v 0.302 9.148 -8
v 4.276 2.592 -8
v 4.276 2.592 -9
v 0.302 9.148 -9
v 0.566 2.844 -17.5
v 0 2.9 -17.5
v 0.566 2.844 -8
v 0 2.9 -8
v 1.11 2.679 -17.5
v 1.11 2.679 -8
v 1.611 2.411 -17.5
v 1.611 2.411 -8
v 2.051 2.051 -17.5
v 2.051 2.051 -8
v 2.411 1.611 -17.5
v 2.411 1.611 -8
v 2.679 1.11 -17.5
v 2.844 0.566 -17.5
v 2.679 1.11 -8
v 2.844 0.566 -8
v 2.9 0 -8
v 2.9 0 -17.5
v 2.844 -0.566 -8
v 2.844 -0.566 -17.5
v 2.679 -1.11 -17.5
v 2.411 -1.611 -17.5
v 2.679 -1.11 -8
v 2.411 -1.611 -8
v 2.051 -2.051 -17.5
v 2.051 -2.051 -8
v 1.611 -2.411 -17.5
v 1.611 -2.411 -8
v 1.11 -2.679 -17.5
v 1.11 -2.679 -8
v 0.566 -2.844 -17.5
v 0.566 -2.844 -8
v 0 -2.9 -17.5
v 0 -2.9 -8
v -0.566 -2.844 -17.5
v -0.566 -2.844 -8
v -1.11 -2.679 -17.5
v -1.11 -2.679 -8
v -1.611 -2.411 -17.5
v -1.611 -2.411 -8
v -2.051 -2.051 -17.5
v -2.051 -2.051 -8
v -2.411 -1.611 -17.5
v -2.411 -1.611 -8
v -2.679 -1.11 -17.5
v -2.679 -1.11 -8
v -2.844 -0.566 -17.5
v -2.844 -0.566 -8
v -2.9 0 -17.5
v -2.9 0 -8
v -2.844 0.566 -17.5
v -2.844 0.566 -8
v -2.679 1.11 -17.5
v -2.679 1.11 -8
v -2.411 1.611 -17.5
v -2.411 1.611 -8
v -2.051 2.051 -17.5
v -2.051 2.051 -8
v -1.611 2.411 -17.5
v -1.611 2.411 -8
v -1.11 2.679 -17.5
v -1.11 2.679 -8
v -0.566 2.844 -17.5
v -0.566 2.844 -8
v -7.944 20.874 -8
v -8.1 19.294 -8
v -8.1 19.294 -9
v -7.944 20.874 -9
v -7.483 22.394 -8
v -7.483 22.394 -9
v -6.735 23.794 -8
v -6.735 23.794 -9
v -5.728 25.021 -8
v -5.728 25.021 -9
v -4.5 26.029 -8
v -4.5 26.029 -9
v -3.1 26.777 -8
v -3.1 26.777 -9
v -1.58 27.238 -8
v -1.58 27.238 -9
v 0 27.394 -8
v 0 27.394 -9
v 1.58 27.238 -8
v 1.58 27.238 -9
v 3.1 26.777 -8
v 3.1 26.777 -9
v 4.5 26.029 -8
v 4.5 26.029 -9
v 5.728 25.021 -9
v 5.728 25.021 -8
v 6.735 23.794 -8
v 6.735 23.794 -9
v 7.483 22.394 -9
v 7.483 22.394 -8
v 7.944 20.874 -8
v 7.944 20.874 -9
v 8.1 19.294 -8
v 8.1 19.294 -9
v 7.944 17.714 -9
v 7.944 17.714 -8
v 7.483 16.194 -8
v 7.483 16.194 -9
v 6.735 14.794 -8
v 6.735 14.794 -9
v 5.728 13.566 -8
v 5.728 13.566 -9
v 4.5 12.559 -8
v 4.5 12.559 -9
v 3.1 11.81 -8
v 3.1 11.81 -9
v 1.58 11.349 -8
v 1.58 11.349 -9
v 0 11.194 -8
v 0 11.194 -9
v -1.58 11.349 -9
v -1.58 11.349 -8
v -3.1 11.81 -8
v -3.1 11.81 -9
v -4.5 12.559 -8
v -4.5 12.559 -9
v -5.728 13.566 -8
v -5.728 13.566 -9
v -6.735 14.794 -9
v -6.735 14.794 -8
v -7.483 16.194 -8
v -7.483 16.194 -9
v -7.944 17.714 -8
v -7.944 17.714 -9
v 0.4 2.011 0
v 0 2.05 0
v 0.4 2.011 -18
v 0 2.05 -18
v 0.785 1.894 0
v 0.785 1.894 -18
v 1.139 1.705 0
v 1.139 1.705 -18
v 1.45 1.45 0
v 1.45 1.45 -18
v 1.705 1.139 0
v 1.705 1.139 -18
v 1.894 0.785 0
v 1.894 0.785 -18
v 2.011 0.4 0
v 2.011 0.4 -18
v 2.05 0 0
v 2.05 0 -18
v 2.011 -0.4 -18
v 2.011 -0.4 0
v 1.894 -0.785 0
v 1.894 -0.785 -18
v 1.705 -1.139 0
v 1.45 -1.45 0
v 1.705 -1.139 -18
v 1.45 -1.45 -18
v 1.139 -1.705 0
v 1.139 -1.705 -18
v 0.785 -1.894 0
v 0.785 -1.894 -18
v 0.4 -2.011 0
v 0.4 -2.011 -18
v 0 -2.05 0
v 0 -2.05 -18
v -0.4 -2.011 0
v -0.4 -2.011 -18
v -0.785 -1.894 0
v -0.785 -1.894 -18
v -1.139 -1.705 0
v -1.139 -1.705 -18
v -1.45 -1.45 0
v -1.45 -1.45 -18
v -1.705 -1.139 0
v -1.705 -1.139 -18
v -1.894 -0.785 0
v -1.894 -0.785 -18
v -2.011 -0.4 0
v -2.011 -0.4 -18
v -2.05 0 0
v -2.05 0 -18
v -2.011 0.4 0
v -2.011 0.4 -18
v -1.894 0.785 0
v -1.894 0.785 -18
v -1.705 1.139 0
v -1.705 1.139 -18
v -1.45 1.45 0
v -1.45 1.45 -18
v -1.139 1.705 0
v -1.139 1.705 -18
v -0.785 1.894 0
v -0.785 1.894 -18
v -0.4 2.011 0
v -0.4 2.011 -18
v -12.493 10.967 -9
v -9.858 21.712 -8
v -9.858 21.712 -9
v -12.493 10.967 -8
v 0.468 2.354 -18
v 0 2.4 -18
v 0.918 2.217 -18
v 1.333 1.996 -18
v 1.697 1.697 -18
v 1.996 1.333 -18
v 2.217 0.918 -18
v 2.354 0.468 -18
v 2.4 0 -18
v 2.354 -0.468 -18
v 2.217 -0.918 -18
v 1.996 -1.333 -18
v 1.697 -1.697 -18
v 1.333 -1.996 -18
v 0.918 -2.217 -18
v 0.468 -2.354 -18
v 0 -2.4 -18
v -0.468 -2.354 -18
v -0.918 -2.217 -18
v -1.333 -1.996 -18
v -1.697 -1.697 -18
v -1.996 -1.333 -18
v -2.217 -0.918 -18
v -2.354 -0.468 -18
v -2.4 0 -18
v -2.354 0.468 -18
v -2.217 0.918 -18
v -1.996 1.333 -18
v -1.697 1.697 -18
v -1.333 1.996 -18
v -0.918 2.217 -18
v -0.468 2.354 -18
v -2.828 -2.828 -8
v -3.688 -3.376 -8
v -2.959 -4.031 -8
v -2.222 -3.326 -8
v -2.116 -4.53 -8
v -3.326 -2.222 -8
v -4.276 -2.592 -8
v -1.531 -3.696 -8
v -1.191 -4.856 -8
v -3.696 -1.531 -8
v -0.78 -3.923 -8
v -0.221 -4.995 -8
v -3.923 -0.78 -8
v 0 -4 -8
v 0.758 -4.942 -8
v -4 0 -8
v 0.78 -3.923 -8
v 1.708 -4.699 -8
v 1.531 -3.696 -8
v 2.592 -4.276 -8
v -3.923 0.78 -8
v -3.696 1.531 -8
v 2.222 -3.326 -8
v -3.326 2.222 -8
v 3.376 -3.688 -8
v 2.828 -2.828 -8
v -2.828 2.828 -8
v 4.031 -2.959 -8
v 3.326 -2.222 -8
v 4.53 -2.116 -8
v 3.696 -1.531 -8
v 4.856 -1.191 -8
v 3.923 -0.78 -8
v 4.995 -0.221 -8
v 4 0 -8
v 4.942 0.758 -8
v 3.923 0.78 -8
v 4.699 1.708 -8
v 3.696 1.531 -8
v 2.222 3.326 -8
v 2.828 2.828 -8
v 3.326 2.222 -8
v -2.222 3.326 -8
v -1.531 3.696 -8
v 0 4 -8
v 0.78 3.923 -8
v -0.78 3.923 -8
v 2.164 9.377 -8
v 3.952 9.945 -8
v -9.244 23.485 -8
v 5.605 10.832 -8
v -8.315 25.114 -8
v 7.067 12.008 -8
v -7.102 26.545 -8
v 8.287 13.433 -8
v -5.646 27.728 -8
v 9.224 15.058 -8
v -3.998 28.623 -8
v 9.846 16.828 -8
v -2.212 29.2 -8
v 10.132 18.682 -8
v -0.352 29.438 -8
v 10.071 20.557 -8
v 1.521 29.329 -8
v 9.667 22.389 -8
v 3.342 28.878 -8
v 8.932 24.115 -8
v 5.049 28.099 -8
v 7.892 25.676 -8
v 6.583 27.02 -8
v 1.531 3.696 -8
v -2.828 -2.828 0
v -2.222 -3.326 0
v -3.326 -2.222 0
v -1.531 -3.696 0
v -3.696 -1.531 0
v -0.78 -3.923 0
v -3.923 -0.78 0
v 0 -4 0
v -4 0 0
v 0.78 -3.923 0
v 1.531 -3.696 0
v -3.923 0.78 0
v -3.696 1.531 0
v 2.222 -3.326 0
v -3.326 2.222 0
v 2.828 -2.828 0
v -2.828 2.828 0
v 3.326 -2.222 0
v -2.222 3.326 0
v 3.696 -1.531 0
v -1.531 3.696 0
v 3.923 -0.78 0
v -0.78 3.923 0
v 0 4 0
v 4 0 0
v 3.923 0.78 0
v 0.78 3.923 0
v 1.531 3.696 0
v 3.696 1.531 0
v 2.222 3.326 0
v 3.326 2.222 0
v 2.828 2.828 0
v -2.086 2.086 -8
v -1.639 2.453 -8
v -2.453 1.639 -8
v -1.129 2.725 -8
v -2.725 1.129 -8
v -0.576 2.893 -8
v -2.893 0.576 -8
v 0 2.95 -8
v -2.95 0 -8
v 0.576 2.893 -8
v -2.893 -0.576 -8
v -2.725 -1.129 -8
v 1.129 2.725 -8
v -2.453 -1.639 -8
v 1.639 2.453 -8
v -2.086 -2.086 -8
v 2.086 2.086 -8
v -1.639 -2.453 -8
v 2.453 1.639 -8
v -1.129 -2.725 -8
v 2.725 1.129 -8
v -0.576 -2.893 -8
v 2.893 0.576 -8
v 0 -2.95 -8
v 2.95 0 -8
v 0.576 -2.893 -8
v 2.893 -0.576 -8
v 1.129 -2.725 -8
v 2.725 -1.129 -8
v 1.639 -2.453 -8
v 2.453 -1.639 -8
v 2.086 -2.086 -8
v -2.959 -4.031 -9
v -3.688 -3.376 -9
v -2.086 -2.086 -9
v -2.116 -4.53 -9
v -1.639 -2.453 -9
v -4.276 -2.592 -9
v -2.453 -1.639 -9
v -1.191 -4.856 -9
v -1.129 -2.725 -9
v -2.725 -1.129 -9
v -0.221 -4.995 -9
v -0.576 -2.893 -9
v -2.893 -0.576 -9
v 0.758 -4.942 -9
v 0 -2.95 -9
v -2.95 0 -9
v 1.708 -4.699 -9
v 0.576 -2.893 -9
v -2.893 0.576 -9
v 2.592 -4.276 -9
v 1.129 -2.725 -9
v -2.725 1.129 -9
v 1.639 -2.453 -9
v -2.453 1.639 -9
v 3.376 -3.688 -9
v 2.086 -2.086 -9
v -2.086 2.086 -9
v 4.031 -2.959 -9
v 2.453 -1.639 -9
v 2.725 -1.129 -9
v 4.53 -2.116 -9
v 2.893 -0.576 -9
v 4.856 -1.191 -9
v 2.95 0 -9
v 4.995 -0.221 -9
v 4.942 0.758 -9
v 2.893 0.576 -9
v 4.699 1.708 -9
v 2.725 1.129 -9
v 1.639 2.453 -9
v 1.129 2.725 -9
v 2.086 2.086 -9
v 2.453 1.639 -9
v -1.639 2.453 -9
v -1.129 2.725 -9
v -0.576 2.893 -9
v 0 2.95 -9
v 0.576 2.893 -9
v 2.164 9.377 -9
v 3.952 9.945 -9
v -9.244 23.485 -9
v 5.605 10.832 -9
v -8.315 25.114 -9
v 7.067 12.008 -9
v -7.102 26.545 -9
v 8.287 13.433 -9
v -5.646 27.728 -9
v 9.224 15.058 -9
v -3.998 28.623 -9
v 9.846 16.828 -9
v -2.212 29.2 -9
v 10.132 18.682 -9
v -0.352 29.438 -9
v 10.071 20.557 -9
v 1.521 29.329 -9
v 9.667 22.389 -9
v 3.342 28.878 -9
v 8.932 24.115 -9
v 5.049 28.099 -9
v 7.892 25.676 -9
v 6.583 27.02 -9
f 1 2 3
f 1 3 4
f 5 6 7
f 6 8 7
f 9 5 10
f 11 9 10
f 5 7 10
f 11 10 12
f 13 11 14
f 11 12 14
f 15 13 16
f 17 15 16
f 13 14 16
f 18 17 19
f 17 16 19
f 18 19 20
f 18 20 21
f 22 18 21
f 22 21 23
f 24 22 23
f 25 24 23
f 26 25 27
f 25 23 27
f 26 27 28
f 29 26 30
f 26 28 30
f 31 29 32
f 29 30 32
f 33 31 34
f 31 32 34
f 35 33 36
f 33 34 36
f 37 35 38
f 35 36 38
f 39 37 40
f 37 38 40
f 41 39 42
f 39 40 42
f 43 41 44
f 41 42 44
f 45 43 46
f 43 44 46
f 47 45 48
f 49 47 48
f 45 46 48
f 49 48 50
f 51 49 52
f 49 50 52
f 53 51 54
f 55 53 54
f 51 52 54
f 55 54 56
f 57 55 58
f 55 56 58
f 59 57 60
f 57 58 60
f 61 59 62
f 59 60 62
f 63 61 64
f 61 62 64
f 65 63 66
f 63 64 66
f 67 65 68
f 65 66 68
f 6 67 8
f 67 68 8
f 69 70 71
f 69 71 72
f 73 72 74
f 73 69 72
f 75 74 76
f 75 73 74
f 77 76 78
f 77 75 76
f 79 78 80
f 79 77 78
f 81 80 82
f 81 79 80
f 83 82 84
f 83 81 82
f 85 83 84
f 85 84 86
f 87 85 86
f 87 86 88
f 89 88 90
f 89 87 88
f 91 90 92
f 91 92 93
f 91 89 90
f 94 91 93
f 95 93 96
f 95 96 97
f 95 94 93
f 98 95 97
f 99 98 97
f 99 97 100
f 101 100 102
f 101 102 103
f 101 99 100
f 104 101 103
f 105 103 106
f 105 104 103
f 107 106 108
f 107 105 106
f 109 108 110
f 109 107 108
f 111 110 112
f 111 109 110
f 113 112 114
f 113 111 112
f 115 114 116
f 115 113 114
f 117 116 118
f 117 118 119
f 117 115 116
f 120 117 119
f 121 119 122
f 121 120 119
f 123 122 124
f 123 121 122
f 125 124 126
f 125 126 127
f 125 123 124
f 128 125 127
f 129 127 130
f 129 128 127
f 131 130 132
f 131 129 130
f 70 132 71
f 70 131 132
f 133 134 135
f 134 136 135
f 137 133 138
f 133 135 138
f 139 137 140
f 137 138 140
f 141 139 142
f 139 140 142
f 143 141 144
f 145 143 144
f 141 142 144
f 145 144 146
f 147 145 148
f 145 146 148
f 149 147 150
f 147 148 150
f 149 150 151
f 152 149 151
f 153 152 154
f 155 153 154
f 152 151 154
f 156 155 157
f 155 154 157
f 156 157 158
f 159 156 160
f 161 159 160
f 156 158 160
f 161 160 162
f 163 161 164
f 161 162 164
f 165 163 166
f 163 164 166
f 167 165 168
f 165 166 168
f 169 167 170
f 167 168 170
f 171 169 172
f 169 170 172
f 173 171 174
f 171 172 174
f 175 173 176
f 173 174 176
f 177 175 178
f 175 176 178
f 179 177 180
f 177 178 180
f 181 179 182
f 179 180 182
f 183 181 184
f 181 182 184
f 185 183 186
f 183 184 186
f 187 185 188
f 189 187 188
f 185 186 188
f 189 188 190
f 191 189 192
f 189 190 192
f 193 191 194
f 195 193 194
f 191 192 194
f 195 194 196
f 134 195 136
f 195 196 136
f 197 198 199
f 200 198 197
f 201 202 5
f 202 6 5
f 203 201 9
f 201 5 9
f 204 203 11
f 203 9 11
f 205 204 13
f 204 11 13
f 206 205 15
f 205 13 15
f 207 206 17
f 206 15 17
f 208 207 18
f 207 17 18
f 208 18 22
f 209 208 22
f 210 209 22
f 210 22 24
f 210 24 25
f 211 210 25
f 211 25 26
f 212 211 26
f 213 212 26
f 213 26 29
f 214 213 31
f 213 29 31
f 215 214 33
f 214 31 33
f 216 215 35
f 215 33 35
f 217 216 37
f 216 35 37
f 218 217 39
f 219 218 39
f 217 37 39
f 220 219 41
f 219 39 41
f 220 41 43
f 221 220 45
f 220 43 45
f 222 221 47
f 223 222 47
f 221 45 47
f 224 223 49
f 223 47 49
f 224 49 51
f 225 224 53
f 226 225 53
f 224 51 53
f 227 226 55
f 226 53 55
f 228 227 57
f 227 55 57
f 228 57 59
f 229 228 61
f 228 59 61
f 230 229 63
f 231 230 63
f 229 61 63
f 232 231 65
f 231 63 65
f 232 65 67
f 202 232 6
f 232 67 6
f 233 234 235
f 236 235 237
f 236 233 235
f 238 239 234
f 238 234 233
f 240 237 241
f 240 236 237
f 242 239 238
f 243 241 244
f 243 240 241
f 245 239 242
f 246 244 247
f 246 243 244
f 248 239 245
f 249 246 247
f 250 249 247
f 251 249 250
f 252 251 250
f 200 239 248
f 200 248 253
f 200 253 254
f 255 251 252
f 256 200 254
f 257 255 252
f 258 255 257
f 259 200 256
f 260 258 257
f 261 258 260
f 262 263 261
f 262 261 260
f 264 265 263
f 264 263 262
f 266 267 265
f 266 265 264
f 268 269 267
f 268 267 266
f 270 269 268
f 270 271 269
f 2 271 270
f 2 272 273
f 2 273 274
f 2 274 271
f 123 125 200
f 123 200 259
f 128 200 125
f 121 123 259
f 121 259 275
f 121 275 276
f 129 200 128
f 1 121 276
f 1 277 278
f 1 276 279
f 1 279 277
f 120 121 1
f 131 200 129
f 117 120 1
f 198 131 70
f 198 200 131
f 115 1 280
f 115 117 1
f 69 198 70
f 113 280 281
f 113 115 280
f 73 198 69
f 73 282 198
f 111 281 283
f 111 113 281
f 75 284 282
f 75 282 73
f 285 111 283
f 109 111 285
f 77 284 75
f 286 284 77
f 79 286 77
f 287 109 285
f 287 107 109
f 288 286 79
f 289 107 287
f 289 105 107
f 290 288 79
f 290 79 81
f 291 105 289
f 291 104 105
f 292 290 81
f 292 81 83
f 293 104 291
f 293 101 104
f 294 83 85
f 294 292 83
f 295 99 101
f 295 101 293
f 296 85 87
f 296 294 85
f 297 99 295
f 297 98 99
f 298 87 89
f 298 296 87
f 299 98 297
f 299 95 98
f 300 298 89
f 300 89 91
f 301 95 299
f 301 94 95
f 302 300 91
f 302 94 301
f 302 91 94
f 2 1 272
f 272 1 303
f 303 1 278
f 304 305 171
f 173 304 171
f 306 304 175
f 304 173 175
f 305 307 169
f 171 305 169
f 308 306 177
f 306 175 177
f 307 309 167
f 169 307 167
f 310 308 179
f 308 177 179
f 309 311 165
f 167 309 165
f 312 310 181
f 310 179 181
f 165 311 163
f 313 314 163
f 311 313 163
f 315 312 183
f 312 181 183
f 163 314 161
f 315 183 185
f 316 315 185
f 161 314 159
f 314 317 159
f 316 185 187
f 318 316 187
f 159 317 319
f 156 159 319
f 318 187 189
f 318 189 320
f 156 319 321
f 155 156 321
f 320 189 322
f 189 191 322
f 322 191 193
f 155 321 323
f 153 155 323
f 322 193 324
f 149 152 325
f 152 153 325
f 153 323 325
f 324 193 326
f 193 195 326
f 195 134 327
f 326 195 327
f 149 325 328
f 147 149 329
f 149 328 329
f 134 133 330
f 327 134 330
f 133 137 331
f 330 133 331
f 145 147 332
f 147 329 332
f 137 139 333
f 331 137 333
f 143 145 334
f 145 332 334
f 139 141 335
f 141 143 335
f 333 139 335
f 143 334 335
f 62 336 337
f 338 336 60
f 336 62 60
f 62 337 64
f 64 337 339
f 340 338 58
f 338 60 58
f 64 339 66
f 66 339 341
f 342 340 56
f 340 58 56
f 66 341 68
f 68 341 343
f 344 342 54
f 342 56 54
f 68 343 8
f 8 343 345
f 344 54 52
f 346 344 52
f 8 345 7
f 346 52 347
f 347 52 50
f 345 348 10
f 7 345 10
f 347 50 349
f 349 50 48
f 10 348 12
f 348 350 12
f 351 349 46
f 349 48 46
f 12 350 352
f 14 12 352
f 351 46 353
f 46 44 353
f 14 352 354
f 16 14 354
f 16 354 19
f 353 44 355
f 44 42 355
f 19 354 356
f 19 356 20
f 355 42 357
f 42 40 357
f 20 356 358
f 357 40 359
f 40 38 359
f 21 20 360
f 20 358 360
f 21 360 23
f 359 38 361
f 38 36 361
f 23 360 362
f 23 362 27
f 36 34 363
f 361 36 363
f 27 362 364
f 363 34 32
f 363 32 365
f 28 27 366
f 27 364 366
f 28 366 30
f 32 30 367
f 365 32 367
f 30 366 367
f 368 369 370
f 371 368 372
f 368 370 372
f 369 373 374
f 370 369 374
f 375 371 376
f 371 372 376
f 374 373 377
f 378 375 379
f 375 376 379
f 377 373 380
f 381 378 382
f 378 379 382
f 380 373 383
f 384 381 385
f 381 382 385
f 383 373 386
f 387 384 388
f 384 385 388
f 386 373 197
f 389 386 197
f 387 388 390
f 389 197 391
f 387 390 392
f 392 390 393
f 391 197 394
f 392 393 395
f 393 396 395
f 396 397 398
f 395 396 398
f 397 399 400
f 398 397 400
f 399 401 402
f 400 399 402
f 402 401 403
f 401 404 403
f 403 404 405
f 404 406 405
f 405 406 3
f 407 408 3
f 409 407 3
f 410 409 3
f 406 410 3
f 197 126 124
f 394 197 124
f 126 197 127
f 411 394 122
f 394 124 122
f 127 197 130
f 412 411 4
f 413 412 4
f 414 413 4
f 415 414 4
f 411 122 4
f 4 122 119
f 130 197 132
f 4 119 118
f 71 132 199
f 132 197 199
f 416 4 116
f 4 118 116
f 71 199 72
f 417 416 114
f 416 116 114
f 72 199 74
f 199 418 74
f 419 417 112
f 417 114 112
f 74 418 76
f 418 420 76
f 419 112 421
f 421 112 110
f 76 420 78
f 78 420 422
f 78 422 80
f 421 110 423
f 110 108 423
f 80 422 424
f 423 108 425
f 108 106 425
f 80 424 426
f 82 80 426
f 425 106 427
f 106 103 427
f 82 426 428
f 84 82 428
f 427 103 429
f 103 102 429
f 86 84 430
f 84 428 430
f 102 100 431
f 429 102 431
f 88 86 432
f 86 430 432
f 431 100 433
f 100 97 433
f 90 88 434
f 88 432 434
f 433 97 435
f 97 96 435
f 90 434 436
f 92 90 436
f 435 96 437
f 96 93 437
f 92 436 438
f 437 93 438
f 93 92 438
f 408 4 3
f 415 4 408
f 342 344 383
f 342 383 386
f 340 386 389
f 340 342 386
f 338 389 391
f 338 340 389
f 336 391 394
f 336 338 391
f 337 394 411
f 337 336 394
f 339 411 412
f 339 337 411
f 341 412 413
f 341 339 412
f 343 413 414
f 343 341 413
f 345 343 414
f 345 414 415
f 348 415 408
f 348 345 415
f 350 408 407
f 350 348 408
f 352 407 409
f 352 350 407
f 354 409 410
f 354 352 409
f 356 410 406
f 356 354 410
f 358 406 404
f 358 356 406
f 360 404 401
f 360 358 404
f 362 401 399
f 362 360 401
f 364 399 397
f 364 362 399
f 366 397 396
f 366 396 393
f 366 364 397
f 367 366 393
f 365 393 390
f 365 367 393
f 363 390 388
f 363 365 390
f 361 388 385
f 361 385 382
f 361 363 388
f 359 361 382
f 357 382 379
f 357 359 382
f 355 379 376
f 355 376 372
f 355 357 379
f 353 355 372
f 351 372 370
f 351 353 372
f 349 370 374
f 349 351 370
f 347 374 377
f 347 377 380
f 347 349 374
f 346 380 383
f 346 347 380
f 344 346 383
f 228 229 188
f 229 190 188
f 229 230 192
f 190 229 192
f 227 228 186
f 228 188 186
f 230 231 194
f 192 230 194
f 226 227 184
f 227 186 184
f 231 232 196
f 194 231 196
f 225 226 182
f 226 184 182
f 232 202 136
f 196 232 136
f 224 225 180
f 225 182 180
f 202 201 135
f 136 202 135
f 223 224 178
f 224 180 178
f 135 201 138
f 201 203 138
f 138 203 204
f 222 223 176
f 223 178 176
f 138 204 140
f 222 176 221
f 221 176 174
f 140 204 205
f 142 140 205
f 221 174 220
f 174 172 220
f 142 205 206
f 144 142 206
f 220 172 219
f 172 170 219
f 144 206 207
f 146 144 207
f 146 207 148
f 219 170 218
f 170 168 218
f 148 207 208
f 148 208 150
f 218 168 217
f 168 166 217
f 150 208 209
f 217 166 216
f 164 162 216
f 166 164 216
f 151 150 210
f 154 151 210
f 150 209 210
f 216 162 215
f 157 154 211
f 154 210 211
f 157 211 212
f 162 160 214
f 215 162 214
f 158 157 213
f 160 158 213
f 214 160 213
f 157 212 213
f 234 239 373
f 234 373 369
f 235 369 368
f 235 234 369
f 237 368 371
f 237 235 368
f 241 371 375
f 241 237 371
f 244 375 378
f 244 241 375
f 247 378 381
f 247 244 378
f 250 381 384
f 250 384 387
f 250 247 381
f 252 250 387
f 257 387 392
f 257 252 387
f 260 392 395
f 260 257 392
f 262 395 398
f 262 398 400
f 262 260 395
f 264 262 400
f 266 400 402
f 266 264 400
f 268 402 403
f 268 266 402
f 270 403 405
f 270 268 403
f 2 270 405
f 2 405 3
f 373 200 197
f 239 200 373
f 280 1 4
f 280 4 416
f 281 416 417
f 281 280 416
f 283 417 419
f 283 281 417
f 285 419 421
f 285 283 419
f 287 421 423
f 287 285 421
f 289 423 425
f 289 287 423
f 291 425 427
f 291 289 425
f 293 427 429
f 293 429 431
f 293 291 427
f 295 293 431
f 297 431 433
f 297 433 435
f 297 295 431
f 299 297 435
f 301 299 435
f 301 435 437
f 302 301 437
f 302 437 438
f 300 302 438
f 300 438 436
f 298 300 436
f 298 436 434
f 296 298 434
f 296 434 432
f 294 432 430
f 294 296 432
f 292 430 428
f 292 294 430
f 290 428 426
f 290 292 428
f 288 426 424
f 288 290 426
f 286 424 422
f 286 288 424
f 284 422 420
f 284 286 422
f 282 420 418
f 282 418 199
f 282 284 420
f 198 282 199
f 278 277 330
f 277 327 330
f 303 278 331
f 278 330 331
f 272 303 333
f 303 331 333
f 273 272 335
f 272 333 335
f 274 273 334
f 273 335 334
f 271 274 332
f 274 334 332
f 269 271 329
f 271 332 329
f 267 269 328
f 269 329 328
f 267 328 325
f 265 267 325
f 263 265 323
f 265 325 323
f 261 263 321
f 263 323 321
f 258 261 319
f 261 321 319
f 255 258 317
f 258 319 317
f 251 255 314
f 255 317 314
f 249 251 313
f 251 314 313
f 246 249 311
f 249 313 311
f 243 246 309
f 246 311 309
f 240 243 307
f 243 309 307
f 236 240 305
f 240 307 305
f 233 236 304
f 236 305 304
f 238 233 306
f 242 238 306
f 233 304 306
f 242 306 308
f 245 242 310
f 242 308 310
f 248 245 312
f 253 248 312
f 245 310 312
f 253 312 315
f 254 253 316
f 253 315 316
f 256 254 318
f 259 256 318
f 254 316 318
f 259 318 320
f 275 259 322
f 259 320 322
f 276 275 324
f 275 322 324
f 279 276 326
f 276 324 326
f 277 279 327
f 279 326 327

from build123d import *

# Parameters (mm, degrees)
SKETCH2_R           = 2.95
SKETCH2_R_2         = 8.099999999
BOSS_EXTRUDE1_DEPTH = 1


with BuildPart() as part:
    # Sketch1 → Revolve1 (revolve)
    with BuildSketch(Plane(origin=(0, 0, 0), x_dir=(0, 0, -1), z_dir=(1, 0, 0))):
        Polygon((18, 2.05), (18, 2.4), (17.5, 2.9), (8, 2.9), (8, 4), (0, 4), (0, 2.05), align=None)
    revolve(axis=Axis((0, 0, 0), (0, 0, -1)))

    # Sketch2 → Boss-Extrude1 (add)
    with BuildSketch(Plane(origin=(0, 0, -8), x_dir=(-1, 0, 0), z_dir=(0, 0, -1))):
        with BuildLine():
            Line((9.857790067, 21.711729889), (12.493283293, 10.967026744))
            Line((12.493283293, 10.967026744), (4.275989158, -2.59150858))
            ThreePointArc((4.275989158, -2.59150858), (-2.59150858, -4.275989158), (-4.275989158, 2.59150858))
            Line((-4.275989158, 2.59150858), (-0.302187827, 9.148280777))
            ThreePointArc((-0.302187827, 9.148280777), (-7.892239666, 25.676183207), (9.857790067, 21.711729889))
        make_face()
        Circle(SKETCH2_R, mode=Mode.SUBTRACT)
        with Locations((0, 19.293781382)):
            Circle(SKETCH2_R_2, mode=Mode.SUBTRACT)
    extrude(amount=BOSS_EXTRUDE1_DEPTH)


solid = part.part
